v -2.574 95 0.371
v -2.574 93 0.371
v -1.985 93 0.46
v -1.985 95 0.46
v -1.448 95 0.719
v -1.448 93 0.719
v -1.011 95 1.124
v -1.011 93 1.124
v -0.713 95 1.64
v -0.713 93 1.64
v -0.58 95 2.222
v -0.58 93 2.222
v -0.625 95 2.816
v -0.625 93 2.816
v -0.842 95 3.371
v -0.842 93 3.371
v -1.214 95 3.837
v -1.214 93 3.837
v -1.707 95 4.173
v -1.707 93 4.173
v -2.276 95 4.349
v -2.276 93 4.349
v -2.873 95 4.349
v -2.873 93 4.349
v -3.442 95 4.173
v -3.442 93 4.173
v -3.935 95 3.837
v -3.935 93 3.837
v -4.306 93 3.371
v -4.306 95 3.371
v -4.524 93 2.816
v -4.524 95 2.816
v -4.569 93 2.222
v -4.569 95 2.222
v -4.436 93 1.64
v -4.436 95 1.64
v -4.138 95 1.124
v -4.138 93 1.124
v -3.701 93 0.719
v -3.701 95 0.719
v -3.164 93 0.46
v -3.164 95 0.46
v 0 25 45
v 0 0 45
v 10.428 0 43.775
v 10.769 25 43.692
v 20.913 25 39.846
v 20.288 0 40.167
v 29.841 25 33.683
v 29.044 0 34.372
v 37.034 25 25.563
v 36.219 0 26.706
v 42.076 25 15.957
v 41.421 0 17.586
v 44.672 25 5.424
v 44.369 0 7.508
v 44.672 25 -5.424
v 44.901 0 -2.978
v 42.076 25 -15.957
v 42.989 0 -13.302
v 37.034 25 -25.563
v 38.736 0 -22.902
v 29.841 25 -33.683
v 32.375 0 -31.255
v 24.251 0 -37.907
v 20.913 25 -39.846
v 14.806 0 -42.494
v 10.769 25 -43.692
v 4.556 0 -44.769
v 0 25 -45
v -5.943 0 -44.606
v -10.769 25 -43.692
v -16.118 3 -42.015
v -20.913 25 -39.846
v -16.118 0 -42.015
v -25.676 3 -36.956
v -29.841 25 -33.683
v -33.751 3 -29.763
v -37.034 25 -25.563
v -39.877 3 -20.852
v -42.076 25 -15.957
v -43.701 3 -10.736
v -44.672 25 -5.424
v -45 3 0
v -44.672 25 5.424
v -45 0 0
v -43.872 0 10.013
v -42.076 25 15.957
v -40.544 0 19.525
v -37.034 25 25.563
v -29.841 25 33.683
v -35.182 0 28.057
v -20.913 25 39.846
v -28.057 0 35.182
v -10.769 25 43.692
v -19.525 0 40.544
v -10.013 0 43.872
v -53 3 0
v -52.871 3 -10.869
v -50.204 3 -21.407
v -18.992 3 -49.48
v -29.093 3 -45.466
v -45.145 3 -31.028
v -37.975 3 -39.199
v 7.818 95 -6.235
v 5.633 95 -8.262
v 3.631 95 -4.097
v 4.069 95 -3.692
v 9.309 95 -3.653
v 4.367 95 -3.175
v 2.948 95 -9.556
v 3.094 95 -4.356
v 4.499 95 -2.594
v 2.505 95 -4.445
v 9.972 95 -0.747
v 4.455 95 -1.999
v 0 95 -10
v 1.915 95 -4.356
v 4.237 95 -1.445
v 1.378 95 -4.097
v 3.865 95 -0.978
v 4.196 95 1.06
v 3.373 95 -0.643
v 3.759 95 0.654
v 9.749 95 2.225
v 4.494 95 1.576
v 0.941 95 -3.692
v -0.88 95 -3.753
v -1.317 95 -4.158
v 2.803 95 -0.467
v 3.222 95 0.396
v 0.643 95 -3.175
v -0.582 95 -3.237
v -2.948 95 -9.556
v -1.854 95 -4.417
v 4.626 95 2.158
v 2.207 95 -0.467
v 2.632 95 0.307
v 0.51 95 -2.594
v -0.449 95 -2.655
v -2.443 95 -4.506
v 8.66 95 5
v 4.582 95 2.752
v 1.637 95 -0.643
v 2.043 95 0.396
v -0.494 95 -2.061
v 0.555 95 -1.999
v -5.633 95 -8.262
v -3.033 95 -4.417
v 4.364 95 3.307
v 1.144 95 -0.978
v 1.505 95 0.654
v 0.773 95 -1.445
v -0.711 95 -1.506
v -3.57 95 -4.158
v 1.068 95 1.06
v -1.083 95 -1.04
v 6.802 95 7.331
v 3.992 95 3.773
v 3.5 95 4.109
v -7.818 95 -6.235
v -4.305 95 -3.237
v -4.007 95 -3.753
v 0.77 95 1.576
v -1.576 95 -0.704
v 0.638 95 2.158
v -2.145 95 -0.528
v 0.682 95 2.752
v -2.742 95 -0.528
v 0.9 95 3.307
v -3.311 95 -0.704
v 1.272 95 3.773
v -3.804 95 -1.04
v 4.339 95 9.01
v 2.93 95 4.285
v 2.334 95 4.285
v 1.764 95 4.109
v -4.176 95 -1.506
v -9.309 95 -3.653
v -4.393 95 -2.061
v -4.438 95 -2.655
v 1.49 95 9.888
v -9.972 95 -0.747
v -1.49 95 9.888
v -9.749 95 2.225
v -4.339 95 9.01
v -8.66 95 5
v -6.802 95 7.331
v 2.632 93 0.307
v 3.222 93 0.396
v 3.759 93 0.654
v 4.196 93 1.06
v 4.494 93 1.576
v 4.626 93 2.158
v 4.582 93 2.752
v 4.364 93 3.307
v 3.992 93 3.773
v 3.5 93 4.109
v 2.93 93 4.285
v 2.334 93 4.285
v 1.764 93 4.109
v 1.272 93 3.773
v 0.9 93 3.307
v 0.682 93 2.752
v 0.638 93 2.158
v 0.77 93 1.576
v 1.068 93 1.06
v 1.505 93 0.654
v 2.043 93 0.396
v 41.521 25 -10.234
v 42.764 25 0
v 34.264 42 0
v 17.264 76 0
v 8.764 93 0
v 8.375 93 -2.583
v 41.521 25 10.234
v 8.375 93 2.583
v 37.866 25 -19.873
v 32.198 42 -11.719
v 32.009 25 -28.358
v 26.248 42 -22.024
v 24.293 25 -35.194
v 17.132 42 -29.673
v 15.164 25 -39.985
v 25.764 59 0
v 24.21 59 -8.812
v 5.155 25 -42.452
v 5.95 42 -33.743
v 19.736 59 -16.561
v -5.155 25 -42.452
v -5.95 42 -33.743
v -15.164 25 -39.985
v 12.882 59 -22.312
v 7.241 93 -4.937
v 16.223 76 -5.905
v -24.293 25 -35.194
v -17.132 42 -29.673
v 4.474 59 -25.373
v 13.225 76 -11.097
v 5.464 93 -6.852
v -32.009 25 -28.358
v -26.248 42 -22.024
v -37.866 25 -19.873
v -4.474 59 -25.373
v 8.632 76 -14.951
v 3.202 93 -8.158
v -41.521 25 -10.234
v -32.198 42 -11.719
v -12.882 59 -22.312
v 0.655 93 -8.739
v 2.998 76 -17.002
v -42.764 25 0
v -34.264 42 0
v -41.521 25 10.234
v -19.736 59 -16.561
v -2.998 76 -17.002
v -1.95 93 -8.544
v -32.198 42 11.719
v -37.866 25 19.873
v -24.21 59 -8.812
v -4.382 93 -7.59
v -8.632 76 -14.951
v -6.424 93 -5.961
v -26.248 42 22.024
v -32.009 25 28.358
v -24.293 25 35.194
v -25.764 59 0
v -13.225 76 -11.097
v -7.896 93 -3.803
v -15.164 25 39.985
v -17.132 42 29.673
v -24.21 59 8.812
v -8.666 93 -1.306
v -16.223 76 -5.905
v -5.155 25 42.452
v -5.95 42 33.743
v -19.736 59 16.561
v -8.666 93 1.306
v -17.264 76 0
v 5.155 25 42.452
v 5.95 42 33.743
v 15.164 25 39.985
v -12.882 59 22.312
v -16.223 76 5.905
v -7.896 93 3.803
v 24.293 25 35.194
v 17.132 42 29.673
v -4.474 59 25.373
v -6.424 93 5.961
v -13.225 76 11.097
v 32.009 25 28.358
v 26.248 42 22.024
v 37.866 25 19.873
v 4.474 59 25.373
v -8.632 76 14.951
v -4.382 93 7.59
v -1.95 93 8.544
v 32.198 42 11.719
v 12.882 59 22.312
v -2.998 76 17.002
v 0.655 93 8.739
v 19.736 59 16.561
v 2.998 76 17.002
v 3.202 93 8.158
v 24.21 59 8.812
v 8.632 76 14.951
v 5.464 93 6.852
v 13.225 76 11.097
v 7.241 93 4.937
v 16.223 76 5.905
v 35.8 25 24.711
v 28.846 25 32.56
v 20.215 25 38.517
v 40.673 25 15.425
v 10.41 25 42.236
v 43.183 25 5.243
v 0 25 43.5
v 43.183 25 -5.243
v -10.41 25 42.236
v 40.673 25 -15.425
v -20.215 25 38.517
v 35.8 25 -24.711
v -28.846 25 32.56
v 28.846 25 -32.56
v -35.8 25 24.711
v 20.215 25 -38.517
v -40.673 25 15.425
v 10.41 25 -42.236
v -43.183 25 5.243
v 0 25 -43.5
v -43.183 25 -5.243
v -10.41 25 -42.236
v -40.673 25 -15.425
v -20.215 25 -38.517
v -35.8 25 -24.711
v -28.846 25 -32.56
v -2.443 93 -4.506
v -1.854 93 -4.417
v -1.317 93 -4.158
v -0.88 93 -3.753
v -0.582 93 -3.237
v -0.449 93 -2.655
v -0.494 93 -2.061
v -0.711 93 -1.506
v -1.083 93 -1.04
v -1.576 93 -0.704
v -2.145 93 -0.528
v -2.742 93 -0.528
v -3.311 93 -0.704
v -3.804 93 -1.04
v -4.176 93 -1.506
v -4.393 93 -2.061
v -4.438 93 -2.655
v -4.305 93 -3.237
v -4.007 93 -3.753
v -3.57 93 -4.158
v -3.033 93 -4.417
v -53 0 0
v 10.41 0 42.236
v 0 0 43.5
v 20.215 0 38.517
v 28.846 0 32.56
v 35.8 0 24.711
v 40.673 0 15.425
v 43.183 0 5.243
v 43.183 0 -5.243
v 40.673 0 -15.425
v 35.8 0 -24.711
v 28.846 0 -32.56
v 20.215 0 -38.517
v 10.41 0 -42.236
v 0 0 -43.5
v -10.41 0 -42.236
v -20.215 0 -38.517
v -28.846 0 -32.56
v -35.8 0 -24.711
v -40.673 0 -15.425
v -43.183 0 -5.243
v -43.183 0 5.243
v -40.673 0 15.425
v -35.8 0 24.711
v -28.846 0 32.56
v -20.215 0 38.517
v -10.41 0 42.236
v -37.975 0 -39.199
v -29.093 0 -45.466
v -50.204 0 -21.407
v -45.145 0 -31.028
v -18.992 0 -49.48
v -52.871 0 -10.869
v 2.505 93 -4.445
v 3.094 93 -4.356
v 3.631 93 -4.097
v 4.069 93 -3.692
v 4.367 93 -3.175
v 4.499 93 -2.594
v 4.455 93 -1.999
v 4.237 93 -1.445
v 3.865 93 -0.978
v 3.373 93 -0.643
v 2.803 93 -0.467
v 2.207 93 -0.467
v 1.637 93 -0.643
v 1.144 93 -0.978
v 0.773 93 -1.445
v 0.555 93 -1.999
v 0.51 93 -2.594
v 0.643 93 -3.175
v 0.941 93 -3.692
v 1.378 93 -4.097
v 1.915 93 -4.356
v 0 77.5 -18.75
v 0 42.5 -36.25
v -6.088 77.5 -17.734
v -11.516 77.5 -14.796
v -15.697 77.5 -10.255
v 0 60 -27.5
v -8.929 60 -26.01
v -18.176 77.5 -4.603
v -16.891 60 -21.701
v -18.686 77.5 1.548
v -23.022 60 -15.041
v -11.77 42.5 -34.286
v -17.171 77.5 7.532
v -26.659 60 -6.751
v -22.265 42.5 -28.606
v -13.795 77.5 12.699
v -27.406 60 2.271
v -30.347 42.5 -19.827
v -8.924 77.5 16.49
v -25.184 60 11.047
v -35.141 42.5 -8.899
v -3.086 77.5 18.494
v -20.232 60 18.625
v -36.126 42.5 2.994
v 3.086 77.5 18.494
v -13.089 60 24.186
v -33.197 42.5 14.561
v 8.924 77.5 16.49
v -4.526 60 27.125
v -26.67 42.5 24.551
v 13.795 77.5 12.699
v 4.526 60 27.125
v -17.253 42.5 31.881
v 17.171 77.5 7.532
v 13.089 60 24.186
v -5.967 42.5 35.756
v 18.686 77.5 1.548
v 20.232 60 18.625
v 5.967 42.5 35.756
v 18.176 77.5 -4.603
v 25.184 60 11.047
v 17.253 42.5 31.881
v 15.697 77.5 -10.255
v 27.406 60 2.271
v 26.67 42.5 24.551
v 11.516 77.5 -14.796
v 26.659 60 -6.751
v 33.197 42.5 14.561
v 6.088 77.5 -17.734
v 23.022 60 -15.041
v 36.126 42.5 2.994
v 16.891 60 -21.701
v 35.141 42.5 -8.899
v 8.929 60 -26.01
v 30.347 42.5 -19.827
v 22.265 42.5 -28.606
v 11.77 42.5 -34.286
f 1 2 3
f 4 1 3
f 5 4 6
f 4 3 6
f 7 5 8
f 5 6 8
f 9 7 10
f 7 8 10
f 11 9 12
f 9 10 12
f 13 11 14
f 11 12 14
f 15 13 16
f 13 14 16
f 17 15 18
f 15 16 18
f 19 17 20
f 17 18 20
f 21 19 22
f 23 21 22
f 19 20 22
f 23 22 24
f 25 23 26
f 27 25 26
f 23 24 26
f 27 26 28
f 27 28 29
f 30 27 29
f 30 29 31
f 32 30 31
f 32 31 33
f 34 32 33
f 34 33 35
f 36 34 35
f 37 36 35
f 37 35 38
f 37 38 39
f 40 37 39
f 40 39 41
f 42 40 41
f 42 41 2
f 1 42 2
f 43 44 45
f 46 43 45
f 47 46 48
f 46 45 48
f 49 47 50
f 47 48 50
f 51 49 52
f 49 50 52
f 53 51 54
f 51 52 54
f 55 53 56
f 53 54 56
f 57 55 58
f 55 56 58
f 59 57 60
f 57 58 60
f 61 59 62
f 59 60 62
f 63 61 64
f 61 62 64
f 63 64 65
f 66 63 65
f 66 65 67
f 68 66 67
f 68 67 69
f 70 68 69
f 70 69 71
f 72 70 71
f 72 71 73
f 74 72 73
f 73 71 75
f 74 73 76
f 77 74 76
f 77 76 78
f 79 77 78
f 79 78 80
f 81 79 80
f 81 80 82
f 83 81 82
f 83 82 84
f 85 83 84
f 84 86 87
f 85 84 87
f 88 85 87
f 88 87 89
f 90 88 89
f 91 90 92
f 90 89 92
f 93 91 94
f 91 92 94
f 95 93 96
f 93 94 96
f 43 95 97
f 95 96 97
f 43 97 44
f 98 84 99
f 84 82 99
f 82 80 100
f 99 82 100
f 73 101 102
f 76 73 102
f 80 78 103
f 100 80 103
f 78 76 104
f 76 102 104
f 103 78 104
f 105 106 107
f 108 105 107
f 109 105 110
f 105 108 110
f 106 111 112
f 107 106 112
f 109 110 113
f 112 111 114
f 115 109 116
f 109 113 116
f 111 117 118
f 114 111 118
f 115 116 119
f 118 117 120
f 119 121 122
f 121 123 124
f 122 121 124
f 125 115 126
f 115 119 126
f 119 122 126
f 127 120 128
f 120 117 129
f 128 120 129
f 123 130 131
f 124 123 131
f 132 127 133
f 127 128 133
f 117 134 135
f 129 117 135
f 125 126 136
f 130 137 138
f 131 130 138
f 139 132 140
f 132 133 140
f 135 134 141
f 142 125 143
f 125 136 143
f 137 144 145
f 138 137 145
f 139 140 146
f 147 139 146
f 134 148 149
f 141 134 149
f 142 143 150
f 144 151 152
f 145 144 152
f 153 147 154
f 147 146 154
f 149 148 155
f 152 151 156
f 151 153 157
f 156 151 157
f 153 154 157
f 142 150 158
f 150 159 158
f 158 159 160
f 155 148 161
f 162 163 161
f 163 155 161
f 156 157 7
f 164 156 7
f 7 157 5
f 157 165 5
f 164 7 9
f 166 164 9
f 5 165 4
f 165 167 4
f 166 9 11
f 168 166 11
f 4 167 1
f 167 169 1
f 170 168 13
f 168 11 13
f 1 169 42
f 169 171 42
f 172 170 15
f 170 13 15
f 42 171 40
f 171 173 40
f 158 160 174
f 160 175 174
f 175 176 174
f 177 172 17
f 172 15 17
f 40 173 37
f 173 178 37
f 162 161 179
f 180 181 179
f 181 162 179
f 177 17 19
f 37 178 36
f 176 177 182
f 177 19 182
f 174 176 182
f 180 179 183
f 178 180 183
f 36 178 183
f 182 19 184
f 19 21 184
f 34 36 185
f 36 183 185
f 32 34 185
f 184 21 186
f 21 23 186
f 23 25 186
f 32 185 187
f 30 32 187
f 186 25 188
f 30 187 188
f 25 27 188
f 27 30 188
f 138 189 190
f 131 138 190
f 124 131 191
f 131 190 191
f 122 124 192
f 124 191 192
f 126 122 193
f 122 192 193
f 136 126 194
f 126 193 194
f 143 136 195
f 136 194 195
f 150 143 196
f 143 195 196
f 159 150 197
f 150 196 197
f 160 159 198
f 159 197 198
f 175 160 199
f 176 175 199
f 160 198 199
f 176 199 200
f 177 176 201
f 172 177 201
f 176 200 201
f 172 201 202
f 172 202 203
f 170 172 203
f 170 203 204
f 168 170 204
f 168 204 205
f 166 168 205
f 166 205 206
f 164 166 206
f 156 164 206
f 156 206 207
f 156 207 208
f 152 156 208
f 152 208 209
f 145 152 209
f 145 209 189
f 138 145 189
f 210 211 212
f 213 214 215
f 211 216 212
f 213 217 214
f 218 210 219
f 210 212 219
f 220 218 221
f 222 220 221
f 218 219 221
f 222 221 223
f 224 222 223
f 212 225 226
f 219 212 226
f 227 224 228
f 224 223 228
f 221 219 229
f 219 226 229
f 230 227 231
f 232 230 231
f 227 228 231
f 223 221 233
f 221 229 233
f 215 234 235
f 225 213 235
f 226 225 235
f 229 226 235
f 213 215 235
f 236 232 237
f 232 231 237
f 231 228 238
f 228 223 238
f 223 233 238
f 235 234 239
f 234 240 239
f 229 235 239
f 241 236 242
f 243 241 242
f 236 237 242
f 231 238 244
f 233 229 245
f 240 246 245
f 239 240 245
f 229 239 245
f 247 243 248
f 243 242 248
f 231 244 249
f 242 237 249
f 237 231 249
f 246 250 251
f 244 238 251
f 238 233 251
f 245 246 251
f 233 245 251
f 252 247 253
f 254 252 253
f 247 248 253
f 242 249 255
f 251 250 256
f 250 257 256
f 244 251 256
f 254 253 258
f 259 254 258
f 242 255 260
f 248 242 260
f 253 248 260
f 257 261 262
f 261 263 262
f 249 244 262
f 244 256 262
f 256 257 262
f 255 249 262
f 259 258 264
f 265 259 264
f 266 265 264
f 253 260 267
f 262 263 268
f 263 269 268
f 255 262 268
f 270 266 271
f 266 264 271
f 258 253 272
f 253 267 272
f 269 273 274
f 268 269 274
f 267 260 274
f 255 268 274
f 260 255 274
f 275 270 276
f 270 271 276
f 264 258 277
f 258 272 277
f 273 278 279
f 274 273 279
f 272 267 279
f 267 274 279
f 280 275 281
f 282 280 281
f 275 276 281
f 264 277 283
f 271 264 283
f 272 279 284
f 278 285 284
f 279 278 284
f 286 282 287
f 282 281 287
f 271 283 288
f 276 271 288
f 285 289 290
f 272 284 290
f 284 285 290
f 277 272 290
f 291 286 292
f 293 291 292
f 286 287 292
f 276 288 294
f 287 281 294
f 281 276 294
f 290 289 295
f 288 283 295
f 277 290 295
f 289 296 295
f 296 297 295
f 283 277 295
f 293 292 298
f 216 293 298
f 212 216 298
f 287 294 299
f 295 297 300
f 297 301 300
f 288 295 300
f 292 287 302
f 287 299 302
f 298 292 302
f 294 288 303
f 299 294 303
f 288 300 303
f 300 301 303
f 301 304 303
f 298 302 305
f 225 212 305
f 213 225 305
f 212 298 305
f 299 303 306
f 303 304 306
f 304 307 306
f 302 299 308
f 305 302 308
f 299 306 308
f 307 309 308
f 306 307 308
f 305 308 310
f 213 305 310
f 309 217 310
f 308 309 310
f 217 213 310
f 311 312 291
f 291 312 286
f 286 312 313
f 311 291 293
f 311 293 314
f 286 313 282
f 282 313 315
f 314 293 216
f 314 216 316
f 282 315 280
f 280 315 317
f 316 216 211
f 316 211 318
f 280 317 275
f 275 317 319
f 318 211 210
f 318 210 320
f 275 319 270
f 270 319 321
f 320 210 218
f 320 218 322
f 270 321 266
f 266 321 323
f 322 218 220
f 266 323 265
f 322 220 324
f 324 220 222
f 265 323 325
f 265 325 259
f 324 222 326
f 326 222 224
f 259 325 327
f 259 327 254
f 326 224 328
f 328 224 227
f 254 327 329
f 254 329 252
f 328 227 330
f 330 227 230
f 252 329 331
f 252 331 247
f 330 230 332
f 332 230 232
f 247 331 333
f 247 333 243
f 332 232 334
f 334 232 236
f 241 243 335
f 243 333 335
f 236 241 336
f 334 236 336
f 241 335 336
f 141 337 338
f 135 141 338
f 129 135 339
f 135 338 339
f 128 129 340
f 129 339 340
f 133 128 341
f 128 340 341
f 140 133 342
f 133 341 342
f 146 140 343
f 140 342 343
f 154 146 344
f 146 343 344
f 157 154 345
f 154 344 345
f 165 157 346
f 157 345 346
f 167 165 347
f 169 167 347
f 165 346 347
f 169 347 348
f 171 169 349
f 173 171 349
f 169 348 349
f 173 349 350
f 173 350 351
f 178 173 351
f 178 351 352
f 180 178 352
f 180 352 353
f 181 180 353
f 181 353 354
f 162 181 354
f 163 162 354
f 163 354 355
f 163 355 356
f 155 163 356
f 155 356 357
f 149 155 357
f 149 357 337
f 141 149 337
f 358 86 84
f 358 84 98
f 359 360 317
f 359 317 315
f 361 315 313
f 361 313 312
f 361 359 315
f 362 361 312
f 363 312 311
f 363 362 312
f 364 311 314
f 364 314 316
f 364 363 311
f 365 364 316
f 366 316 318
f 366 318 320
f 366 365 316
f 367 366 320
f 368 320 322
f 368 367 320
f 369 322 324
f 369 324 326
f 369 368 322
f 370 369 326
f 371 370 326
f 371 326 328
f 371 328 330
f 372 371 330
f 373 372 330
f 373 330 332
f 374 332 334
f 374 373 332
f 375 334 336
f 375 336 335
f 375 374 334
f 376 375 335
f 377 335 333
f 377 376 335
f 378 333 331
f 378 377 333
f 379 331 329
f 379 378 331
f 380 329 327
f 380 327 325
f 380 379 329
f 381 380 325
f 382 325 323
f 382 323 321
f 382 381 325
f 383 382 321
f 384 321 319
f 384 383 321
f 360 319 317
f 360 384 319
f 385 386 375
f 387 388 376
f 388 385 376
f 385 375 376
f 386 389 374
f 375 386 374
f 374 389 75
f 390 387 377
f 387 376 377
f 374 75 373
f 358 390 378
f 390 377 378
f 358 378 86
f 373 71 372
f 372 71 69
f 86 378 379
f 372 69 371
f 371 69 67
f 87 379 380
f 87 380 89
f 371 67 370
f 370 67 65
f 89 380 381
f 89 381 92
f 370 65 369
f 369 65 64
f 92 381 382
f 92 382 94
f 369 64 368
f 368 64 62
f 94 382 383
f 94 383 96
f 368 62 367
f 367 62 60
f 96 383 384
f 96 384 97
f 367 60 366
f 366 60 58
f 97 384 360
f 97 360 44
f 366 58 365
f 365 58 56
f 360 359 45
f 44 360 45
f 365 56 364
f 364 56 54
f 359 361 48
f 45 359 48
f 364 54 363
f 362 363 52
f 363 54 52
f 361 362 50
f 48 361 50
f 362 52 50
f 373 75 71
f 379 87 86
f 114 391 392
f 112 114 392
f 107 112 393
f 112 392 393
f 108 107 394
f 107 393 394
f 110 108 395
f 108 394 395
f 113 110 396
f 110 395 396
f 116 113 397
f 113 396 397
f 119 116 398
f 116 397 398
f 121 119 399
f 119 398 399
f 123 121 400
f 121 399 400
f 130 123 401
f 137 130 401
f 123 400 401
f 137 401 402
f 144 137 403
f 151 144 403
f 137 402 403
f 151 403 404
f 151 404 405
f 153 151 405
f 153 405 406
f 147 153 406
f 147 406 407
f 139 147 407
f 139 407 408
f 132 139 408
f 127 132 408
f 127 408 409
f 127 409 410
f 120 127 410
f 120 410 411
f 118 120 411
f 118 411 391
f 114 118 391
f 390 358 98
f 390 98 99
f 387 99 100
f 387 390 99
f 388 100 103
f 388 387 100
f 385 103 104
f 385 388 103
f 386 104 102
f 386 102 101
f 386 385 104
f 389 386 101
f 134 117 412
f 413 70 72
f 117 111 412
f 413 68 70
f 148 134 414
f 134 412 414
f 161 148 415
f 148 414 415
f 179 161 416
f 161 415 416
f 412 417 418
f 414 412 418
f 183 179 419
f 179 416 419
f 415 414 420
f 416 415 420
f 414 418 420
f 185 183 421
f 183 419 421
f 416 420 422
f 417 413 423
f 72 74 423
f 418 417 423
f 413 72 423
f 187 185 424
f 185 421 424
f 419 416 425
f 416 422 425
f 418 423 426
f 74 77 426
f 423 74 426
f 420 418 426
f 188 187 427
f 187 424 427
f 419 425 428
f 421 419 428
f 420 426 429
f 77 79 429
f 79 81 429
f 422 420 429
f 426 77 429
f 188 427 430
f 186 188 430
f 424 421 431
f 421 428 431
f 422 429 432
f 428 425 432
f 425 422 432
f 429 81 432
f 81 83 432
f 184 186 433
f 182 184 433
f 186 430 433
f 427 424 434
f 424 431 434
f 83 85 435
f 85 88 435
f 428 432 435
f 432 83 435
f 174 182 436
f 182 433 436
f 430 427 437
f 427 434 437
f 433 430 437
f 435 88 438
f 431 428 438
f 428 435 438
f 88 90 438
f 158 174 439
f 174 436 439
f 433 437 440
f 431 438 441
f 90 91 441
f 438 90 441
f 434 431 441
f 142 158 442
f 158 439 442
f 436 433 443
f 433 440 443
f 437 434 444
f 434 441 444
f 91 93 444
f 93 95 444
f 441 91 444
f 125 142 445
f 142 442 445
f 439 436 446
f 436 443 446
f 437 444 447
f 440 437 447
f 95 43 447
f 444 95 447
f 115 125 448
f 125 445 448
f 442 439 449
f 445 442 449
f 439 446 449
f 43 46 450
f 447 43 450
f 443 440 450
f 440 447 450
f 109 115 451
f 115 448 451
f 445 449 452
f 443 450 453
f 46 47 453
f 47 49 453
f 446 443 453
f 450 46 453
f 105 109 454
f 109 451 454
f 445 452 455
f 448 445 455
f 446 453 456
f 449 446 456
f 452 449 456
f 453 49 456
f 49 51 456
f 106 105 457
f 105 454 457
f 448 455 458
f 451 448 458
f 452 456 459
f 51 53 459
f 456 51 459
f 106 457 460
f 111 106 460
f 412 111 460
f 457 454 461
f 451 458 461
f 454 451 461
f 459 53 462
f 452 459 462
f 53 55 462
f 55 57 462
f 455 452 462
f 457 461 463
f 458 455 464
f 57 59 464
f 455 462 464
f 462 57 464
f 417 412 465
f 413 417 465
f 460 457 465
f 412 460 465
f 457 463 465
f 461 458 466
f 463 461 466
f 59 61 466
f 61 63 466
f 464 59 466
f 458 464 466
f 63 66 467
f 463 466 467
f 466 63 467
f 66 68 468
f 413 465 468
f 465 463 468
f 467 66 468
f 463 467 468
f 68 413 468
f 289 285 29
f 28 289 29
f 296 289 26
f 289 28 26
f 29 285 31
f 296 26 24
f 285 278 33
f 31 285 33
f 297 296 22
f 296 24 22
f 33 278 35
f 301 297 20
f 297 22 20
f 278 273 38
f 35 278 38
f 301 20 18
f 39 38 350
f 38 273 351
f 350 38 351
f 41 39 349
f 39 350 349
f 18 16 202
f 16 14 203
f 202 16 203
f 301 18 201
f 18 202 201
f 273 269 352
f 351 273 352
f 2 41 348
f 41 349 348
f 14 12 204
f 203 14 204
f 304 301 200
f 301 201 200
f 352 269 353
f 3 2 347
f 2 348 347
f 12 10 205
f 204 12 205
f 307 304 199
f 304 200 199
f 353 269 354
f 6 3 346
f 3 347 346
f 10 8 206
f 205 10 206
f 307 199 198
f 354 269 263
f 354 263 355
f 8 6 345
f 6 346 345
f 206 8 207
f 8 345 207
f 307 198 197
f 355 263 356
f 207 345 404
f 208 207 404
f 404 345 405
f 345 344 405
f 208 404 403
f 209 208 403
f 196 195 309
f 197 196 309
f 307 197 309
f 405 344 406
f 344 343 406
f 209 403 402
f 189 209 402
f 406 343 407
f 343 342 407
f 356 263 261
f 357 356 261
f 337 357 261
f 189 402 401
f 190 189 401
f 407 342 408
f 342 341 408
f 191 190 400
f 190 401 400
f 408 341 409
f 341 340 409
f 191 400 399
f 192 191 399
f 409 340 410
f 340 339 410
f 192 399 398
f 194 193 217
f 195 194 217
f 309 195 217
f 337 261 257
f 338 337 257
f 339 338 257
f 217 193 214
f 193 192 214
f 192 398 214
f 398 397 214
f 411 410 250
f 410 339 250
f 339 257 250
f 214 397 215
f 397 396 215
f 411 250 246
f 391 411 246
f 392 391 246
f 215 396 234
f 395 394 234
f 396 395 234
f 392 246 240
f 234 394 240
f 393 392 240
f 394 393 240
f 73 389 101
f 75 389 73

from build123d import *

# Parameters (mm, degrees)
SKETCH_1_R          = 45
SKETCH_1_R_2        = 43.5
EXTRUDE_1_DEPTH     = 25
EXTRUDE_2_DEPTH     = 3
SKETCH_6_R          = 2
CUT_EXTRUDE_1_DEPTH = 3


# Read off the part's stored shape, not the designer's step: 抽壳9
with BuildPart() as part:
    # 草图1 → 凸台-拉伸1 (new body)
    with BuildSketch(Plane(origin=(0, 0, 0), x_dir=(1, 0, 0), z_dir=(0, 1, 0))):
        with Locations(Location((0, 0, 0), (0, 0, 270))):
            Circle(SKETCH_1_R)
        with Locations(Location((0, 0, 0), (0, 0, 270))):
            Circle(SKETCH_1_R_2, mode=Mode.SUBTRACT)
    extrude(amount=EXTRUDE_1_DEPTH)

    # 草图2 → 凸台-拉伸2 (add)
    with BuildSketch(Plane(origin=(0, 0, 0), x_dir=(1, 0, 0), z_dir=(0, 1, 0))):
        with BuildLine():
            Line((-45, 0), (-53, 0))
            ThreePointArc((-53, 0), (-45.144679687, 31.028280094), (-18.991709994, 49.480445253))
            Line((-18.991709994, 49.480445253), (-16.117646372, 42.014538858))
            ThreePointArc((-16.117646372, 42.014538858), (-37.082975115, 25.492213647), (-45, 0))
        make_face()
    extrude(amount=EXTRUDE_2_DEPTH)

    # 草图5 → 旋转3 (revolve)
    with BuildSketch(Plane.XY, mode=Mode.PRIVATE) as revolve_3_sk:
        Polygon((-45, 25), (0, 25), (0, 95), (-10, 95), align=None)
    revolve(revolve_3_sk.sketch.rotate(Axis((0, 25, 0), (0, 1, 0)), 270), axis=Axis((0, 25, 0), (0, 1, 0)))

    # 抽壳9 outline → 抽壳9 (revolve, cut)
    with BuildSketch(Plane.XY):
        Polygon((42.763932023, 25), (8.763932023, 93), (0, 93), (0, 25), align=None)
    revolve(axis=Axis((0, 0, 0), (0, 1, 0)), mode=Mode.SUBTRACT)

    # 草图6 → 切除-拉伸1 (cut)
    with BuildSketch(Plane.XZ.offset(-93)):
        with Locations(Location((-2.574448684, 2.371120826, 0), (0, 0, 270))):
            Circle(SKETCH_6_R)
        with Locations(Location((2.6320911, 2.306966935, 0), (0, 0, 270))):
            Circle(SKETCH_6_R)
        with Locations(Location((-2.443496184, -2.505858416, 0), (0, 0, 270))):
            Circle(SKETCH_6_R)
        with Locations(Location((2.504843697, -2.444536368, 0), (0, 0, 270))):
            Circle(SKETCH_6_R)
    extrude(amount=-CUT_EXTRUDE_1_DEPTH, mode=Mode.SUBTRACT)


solid = part.part
